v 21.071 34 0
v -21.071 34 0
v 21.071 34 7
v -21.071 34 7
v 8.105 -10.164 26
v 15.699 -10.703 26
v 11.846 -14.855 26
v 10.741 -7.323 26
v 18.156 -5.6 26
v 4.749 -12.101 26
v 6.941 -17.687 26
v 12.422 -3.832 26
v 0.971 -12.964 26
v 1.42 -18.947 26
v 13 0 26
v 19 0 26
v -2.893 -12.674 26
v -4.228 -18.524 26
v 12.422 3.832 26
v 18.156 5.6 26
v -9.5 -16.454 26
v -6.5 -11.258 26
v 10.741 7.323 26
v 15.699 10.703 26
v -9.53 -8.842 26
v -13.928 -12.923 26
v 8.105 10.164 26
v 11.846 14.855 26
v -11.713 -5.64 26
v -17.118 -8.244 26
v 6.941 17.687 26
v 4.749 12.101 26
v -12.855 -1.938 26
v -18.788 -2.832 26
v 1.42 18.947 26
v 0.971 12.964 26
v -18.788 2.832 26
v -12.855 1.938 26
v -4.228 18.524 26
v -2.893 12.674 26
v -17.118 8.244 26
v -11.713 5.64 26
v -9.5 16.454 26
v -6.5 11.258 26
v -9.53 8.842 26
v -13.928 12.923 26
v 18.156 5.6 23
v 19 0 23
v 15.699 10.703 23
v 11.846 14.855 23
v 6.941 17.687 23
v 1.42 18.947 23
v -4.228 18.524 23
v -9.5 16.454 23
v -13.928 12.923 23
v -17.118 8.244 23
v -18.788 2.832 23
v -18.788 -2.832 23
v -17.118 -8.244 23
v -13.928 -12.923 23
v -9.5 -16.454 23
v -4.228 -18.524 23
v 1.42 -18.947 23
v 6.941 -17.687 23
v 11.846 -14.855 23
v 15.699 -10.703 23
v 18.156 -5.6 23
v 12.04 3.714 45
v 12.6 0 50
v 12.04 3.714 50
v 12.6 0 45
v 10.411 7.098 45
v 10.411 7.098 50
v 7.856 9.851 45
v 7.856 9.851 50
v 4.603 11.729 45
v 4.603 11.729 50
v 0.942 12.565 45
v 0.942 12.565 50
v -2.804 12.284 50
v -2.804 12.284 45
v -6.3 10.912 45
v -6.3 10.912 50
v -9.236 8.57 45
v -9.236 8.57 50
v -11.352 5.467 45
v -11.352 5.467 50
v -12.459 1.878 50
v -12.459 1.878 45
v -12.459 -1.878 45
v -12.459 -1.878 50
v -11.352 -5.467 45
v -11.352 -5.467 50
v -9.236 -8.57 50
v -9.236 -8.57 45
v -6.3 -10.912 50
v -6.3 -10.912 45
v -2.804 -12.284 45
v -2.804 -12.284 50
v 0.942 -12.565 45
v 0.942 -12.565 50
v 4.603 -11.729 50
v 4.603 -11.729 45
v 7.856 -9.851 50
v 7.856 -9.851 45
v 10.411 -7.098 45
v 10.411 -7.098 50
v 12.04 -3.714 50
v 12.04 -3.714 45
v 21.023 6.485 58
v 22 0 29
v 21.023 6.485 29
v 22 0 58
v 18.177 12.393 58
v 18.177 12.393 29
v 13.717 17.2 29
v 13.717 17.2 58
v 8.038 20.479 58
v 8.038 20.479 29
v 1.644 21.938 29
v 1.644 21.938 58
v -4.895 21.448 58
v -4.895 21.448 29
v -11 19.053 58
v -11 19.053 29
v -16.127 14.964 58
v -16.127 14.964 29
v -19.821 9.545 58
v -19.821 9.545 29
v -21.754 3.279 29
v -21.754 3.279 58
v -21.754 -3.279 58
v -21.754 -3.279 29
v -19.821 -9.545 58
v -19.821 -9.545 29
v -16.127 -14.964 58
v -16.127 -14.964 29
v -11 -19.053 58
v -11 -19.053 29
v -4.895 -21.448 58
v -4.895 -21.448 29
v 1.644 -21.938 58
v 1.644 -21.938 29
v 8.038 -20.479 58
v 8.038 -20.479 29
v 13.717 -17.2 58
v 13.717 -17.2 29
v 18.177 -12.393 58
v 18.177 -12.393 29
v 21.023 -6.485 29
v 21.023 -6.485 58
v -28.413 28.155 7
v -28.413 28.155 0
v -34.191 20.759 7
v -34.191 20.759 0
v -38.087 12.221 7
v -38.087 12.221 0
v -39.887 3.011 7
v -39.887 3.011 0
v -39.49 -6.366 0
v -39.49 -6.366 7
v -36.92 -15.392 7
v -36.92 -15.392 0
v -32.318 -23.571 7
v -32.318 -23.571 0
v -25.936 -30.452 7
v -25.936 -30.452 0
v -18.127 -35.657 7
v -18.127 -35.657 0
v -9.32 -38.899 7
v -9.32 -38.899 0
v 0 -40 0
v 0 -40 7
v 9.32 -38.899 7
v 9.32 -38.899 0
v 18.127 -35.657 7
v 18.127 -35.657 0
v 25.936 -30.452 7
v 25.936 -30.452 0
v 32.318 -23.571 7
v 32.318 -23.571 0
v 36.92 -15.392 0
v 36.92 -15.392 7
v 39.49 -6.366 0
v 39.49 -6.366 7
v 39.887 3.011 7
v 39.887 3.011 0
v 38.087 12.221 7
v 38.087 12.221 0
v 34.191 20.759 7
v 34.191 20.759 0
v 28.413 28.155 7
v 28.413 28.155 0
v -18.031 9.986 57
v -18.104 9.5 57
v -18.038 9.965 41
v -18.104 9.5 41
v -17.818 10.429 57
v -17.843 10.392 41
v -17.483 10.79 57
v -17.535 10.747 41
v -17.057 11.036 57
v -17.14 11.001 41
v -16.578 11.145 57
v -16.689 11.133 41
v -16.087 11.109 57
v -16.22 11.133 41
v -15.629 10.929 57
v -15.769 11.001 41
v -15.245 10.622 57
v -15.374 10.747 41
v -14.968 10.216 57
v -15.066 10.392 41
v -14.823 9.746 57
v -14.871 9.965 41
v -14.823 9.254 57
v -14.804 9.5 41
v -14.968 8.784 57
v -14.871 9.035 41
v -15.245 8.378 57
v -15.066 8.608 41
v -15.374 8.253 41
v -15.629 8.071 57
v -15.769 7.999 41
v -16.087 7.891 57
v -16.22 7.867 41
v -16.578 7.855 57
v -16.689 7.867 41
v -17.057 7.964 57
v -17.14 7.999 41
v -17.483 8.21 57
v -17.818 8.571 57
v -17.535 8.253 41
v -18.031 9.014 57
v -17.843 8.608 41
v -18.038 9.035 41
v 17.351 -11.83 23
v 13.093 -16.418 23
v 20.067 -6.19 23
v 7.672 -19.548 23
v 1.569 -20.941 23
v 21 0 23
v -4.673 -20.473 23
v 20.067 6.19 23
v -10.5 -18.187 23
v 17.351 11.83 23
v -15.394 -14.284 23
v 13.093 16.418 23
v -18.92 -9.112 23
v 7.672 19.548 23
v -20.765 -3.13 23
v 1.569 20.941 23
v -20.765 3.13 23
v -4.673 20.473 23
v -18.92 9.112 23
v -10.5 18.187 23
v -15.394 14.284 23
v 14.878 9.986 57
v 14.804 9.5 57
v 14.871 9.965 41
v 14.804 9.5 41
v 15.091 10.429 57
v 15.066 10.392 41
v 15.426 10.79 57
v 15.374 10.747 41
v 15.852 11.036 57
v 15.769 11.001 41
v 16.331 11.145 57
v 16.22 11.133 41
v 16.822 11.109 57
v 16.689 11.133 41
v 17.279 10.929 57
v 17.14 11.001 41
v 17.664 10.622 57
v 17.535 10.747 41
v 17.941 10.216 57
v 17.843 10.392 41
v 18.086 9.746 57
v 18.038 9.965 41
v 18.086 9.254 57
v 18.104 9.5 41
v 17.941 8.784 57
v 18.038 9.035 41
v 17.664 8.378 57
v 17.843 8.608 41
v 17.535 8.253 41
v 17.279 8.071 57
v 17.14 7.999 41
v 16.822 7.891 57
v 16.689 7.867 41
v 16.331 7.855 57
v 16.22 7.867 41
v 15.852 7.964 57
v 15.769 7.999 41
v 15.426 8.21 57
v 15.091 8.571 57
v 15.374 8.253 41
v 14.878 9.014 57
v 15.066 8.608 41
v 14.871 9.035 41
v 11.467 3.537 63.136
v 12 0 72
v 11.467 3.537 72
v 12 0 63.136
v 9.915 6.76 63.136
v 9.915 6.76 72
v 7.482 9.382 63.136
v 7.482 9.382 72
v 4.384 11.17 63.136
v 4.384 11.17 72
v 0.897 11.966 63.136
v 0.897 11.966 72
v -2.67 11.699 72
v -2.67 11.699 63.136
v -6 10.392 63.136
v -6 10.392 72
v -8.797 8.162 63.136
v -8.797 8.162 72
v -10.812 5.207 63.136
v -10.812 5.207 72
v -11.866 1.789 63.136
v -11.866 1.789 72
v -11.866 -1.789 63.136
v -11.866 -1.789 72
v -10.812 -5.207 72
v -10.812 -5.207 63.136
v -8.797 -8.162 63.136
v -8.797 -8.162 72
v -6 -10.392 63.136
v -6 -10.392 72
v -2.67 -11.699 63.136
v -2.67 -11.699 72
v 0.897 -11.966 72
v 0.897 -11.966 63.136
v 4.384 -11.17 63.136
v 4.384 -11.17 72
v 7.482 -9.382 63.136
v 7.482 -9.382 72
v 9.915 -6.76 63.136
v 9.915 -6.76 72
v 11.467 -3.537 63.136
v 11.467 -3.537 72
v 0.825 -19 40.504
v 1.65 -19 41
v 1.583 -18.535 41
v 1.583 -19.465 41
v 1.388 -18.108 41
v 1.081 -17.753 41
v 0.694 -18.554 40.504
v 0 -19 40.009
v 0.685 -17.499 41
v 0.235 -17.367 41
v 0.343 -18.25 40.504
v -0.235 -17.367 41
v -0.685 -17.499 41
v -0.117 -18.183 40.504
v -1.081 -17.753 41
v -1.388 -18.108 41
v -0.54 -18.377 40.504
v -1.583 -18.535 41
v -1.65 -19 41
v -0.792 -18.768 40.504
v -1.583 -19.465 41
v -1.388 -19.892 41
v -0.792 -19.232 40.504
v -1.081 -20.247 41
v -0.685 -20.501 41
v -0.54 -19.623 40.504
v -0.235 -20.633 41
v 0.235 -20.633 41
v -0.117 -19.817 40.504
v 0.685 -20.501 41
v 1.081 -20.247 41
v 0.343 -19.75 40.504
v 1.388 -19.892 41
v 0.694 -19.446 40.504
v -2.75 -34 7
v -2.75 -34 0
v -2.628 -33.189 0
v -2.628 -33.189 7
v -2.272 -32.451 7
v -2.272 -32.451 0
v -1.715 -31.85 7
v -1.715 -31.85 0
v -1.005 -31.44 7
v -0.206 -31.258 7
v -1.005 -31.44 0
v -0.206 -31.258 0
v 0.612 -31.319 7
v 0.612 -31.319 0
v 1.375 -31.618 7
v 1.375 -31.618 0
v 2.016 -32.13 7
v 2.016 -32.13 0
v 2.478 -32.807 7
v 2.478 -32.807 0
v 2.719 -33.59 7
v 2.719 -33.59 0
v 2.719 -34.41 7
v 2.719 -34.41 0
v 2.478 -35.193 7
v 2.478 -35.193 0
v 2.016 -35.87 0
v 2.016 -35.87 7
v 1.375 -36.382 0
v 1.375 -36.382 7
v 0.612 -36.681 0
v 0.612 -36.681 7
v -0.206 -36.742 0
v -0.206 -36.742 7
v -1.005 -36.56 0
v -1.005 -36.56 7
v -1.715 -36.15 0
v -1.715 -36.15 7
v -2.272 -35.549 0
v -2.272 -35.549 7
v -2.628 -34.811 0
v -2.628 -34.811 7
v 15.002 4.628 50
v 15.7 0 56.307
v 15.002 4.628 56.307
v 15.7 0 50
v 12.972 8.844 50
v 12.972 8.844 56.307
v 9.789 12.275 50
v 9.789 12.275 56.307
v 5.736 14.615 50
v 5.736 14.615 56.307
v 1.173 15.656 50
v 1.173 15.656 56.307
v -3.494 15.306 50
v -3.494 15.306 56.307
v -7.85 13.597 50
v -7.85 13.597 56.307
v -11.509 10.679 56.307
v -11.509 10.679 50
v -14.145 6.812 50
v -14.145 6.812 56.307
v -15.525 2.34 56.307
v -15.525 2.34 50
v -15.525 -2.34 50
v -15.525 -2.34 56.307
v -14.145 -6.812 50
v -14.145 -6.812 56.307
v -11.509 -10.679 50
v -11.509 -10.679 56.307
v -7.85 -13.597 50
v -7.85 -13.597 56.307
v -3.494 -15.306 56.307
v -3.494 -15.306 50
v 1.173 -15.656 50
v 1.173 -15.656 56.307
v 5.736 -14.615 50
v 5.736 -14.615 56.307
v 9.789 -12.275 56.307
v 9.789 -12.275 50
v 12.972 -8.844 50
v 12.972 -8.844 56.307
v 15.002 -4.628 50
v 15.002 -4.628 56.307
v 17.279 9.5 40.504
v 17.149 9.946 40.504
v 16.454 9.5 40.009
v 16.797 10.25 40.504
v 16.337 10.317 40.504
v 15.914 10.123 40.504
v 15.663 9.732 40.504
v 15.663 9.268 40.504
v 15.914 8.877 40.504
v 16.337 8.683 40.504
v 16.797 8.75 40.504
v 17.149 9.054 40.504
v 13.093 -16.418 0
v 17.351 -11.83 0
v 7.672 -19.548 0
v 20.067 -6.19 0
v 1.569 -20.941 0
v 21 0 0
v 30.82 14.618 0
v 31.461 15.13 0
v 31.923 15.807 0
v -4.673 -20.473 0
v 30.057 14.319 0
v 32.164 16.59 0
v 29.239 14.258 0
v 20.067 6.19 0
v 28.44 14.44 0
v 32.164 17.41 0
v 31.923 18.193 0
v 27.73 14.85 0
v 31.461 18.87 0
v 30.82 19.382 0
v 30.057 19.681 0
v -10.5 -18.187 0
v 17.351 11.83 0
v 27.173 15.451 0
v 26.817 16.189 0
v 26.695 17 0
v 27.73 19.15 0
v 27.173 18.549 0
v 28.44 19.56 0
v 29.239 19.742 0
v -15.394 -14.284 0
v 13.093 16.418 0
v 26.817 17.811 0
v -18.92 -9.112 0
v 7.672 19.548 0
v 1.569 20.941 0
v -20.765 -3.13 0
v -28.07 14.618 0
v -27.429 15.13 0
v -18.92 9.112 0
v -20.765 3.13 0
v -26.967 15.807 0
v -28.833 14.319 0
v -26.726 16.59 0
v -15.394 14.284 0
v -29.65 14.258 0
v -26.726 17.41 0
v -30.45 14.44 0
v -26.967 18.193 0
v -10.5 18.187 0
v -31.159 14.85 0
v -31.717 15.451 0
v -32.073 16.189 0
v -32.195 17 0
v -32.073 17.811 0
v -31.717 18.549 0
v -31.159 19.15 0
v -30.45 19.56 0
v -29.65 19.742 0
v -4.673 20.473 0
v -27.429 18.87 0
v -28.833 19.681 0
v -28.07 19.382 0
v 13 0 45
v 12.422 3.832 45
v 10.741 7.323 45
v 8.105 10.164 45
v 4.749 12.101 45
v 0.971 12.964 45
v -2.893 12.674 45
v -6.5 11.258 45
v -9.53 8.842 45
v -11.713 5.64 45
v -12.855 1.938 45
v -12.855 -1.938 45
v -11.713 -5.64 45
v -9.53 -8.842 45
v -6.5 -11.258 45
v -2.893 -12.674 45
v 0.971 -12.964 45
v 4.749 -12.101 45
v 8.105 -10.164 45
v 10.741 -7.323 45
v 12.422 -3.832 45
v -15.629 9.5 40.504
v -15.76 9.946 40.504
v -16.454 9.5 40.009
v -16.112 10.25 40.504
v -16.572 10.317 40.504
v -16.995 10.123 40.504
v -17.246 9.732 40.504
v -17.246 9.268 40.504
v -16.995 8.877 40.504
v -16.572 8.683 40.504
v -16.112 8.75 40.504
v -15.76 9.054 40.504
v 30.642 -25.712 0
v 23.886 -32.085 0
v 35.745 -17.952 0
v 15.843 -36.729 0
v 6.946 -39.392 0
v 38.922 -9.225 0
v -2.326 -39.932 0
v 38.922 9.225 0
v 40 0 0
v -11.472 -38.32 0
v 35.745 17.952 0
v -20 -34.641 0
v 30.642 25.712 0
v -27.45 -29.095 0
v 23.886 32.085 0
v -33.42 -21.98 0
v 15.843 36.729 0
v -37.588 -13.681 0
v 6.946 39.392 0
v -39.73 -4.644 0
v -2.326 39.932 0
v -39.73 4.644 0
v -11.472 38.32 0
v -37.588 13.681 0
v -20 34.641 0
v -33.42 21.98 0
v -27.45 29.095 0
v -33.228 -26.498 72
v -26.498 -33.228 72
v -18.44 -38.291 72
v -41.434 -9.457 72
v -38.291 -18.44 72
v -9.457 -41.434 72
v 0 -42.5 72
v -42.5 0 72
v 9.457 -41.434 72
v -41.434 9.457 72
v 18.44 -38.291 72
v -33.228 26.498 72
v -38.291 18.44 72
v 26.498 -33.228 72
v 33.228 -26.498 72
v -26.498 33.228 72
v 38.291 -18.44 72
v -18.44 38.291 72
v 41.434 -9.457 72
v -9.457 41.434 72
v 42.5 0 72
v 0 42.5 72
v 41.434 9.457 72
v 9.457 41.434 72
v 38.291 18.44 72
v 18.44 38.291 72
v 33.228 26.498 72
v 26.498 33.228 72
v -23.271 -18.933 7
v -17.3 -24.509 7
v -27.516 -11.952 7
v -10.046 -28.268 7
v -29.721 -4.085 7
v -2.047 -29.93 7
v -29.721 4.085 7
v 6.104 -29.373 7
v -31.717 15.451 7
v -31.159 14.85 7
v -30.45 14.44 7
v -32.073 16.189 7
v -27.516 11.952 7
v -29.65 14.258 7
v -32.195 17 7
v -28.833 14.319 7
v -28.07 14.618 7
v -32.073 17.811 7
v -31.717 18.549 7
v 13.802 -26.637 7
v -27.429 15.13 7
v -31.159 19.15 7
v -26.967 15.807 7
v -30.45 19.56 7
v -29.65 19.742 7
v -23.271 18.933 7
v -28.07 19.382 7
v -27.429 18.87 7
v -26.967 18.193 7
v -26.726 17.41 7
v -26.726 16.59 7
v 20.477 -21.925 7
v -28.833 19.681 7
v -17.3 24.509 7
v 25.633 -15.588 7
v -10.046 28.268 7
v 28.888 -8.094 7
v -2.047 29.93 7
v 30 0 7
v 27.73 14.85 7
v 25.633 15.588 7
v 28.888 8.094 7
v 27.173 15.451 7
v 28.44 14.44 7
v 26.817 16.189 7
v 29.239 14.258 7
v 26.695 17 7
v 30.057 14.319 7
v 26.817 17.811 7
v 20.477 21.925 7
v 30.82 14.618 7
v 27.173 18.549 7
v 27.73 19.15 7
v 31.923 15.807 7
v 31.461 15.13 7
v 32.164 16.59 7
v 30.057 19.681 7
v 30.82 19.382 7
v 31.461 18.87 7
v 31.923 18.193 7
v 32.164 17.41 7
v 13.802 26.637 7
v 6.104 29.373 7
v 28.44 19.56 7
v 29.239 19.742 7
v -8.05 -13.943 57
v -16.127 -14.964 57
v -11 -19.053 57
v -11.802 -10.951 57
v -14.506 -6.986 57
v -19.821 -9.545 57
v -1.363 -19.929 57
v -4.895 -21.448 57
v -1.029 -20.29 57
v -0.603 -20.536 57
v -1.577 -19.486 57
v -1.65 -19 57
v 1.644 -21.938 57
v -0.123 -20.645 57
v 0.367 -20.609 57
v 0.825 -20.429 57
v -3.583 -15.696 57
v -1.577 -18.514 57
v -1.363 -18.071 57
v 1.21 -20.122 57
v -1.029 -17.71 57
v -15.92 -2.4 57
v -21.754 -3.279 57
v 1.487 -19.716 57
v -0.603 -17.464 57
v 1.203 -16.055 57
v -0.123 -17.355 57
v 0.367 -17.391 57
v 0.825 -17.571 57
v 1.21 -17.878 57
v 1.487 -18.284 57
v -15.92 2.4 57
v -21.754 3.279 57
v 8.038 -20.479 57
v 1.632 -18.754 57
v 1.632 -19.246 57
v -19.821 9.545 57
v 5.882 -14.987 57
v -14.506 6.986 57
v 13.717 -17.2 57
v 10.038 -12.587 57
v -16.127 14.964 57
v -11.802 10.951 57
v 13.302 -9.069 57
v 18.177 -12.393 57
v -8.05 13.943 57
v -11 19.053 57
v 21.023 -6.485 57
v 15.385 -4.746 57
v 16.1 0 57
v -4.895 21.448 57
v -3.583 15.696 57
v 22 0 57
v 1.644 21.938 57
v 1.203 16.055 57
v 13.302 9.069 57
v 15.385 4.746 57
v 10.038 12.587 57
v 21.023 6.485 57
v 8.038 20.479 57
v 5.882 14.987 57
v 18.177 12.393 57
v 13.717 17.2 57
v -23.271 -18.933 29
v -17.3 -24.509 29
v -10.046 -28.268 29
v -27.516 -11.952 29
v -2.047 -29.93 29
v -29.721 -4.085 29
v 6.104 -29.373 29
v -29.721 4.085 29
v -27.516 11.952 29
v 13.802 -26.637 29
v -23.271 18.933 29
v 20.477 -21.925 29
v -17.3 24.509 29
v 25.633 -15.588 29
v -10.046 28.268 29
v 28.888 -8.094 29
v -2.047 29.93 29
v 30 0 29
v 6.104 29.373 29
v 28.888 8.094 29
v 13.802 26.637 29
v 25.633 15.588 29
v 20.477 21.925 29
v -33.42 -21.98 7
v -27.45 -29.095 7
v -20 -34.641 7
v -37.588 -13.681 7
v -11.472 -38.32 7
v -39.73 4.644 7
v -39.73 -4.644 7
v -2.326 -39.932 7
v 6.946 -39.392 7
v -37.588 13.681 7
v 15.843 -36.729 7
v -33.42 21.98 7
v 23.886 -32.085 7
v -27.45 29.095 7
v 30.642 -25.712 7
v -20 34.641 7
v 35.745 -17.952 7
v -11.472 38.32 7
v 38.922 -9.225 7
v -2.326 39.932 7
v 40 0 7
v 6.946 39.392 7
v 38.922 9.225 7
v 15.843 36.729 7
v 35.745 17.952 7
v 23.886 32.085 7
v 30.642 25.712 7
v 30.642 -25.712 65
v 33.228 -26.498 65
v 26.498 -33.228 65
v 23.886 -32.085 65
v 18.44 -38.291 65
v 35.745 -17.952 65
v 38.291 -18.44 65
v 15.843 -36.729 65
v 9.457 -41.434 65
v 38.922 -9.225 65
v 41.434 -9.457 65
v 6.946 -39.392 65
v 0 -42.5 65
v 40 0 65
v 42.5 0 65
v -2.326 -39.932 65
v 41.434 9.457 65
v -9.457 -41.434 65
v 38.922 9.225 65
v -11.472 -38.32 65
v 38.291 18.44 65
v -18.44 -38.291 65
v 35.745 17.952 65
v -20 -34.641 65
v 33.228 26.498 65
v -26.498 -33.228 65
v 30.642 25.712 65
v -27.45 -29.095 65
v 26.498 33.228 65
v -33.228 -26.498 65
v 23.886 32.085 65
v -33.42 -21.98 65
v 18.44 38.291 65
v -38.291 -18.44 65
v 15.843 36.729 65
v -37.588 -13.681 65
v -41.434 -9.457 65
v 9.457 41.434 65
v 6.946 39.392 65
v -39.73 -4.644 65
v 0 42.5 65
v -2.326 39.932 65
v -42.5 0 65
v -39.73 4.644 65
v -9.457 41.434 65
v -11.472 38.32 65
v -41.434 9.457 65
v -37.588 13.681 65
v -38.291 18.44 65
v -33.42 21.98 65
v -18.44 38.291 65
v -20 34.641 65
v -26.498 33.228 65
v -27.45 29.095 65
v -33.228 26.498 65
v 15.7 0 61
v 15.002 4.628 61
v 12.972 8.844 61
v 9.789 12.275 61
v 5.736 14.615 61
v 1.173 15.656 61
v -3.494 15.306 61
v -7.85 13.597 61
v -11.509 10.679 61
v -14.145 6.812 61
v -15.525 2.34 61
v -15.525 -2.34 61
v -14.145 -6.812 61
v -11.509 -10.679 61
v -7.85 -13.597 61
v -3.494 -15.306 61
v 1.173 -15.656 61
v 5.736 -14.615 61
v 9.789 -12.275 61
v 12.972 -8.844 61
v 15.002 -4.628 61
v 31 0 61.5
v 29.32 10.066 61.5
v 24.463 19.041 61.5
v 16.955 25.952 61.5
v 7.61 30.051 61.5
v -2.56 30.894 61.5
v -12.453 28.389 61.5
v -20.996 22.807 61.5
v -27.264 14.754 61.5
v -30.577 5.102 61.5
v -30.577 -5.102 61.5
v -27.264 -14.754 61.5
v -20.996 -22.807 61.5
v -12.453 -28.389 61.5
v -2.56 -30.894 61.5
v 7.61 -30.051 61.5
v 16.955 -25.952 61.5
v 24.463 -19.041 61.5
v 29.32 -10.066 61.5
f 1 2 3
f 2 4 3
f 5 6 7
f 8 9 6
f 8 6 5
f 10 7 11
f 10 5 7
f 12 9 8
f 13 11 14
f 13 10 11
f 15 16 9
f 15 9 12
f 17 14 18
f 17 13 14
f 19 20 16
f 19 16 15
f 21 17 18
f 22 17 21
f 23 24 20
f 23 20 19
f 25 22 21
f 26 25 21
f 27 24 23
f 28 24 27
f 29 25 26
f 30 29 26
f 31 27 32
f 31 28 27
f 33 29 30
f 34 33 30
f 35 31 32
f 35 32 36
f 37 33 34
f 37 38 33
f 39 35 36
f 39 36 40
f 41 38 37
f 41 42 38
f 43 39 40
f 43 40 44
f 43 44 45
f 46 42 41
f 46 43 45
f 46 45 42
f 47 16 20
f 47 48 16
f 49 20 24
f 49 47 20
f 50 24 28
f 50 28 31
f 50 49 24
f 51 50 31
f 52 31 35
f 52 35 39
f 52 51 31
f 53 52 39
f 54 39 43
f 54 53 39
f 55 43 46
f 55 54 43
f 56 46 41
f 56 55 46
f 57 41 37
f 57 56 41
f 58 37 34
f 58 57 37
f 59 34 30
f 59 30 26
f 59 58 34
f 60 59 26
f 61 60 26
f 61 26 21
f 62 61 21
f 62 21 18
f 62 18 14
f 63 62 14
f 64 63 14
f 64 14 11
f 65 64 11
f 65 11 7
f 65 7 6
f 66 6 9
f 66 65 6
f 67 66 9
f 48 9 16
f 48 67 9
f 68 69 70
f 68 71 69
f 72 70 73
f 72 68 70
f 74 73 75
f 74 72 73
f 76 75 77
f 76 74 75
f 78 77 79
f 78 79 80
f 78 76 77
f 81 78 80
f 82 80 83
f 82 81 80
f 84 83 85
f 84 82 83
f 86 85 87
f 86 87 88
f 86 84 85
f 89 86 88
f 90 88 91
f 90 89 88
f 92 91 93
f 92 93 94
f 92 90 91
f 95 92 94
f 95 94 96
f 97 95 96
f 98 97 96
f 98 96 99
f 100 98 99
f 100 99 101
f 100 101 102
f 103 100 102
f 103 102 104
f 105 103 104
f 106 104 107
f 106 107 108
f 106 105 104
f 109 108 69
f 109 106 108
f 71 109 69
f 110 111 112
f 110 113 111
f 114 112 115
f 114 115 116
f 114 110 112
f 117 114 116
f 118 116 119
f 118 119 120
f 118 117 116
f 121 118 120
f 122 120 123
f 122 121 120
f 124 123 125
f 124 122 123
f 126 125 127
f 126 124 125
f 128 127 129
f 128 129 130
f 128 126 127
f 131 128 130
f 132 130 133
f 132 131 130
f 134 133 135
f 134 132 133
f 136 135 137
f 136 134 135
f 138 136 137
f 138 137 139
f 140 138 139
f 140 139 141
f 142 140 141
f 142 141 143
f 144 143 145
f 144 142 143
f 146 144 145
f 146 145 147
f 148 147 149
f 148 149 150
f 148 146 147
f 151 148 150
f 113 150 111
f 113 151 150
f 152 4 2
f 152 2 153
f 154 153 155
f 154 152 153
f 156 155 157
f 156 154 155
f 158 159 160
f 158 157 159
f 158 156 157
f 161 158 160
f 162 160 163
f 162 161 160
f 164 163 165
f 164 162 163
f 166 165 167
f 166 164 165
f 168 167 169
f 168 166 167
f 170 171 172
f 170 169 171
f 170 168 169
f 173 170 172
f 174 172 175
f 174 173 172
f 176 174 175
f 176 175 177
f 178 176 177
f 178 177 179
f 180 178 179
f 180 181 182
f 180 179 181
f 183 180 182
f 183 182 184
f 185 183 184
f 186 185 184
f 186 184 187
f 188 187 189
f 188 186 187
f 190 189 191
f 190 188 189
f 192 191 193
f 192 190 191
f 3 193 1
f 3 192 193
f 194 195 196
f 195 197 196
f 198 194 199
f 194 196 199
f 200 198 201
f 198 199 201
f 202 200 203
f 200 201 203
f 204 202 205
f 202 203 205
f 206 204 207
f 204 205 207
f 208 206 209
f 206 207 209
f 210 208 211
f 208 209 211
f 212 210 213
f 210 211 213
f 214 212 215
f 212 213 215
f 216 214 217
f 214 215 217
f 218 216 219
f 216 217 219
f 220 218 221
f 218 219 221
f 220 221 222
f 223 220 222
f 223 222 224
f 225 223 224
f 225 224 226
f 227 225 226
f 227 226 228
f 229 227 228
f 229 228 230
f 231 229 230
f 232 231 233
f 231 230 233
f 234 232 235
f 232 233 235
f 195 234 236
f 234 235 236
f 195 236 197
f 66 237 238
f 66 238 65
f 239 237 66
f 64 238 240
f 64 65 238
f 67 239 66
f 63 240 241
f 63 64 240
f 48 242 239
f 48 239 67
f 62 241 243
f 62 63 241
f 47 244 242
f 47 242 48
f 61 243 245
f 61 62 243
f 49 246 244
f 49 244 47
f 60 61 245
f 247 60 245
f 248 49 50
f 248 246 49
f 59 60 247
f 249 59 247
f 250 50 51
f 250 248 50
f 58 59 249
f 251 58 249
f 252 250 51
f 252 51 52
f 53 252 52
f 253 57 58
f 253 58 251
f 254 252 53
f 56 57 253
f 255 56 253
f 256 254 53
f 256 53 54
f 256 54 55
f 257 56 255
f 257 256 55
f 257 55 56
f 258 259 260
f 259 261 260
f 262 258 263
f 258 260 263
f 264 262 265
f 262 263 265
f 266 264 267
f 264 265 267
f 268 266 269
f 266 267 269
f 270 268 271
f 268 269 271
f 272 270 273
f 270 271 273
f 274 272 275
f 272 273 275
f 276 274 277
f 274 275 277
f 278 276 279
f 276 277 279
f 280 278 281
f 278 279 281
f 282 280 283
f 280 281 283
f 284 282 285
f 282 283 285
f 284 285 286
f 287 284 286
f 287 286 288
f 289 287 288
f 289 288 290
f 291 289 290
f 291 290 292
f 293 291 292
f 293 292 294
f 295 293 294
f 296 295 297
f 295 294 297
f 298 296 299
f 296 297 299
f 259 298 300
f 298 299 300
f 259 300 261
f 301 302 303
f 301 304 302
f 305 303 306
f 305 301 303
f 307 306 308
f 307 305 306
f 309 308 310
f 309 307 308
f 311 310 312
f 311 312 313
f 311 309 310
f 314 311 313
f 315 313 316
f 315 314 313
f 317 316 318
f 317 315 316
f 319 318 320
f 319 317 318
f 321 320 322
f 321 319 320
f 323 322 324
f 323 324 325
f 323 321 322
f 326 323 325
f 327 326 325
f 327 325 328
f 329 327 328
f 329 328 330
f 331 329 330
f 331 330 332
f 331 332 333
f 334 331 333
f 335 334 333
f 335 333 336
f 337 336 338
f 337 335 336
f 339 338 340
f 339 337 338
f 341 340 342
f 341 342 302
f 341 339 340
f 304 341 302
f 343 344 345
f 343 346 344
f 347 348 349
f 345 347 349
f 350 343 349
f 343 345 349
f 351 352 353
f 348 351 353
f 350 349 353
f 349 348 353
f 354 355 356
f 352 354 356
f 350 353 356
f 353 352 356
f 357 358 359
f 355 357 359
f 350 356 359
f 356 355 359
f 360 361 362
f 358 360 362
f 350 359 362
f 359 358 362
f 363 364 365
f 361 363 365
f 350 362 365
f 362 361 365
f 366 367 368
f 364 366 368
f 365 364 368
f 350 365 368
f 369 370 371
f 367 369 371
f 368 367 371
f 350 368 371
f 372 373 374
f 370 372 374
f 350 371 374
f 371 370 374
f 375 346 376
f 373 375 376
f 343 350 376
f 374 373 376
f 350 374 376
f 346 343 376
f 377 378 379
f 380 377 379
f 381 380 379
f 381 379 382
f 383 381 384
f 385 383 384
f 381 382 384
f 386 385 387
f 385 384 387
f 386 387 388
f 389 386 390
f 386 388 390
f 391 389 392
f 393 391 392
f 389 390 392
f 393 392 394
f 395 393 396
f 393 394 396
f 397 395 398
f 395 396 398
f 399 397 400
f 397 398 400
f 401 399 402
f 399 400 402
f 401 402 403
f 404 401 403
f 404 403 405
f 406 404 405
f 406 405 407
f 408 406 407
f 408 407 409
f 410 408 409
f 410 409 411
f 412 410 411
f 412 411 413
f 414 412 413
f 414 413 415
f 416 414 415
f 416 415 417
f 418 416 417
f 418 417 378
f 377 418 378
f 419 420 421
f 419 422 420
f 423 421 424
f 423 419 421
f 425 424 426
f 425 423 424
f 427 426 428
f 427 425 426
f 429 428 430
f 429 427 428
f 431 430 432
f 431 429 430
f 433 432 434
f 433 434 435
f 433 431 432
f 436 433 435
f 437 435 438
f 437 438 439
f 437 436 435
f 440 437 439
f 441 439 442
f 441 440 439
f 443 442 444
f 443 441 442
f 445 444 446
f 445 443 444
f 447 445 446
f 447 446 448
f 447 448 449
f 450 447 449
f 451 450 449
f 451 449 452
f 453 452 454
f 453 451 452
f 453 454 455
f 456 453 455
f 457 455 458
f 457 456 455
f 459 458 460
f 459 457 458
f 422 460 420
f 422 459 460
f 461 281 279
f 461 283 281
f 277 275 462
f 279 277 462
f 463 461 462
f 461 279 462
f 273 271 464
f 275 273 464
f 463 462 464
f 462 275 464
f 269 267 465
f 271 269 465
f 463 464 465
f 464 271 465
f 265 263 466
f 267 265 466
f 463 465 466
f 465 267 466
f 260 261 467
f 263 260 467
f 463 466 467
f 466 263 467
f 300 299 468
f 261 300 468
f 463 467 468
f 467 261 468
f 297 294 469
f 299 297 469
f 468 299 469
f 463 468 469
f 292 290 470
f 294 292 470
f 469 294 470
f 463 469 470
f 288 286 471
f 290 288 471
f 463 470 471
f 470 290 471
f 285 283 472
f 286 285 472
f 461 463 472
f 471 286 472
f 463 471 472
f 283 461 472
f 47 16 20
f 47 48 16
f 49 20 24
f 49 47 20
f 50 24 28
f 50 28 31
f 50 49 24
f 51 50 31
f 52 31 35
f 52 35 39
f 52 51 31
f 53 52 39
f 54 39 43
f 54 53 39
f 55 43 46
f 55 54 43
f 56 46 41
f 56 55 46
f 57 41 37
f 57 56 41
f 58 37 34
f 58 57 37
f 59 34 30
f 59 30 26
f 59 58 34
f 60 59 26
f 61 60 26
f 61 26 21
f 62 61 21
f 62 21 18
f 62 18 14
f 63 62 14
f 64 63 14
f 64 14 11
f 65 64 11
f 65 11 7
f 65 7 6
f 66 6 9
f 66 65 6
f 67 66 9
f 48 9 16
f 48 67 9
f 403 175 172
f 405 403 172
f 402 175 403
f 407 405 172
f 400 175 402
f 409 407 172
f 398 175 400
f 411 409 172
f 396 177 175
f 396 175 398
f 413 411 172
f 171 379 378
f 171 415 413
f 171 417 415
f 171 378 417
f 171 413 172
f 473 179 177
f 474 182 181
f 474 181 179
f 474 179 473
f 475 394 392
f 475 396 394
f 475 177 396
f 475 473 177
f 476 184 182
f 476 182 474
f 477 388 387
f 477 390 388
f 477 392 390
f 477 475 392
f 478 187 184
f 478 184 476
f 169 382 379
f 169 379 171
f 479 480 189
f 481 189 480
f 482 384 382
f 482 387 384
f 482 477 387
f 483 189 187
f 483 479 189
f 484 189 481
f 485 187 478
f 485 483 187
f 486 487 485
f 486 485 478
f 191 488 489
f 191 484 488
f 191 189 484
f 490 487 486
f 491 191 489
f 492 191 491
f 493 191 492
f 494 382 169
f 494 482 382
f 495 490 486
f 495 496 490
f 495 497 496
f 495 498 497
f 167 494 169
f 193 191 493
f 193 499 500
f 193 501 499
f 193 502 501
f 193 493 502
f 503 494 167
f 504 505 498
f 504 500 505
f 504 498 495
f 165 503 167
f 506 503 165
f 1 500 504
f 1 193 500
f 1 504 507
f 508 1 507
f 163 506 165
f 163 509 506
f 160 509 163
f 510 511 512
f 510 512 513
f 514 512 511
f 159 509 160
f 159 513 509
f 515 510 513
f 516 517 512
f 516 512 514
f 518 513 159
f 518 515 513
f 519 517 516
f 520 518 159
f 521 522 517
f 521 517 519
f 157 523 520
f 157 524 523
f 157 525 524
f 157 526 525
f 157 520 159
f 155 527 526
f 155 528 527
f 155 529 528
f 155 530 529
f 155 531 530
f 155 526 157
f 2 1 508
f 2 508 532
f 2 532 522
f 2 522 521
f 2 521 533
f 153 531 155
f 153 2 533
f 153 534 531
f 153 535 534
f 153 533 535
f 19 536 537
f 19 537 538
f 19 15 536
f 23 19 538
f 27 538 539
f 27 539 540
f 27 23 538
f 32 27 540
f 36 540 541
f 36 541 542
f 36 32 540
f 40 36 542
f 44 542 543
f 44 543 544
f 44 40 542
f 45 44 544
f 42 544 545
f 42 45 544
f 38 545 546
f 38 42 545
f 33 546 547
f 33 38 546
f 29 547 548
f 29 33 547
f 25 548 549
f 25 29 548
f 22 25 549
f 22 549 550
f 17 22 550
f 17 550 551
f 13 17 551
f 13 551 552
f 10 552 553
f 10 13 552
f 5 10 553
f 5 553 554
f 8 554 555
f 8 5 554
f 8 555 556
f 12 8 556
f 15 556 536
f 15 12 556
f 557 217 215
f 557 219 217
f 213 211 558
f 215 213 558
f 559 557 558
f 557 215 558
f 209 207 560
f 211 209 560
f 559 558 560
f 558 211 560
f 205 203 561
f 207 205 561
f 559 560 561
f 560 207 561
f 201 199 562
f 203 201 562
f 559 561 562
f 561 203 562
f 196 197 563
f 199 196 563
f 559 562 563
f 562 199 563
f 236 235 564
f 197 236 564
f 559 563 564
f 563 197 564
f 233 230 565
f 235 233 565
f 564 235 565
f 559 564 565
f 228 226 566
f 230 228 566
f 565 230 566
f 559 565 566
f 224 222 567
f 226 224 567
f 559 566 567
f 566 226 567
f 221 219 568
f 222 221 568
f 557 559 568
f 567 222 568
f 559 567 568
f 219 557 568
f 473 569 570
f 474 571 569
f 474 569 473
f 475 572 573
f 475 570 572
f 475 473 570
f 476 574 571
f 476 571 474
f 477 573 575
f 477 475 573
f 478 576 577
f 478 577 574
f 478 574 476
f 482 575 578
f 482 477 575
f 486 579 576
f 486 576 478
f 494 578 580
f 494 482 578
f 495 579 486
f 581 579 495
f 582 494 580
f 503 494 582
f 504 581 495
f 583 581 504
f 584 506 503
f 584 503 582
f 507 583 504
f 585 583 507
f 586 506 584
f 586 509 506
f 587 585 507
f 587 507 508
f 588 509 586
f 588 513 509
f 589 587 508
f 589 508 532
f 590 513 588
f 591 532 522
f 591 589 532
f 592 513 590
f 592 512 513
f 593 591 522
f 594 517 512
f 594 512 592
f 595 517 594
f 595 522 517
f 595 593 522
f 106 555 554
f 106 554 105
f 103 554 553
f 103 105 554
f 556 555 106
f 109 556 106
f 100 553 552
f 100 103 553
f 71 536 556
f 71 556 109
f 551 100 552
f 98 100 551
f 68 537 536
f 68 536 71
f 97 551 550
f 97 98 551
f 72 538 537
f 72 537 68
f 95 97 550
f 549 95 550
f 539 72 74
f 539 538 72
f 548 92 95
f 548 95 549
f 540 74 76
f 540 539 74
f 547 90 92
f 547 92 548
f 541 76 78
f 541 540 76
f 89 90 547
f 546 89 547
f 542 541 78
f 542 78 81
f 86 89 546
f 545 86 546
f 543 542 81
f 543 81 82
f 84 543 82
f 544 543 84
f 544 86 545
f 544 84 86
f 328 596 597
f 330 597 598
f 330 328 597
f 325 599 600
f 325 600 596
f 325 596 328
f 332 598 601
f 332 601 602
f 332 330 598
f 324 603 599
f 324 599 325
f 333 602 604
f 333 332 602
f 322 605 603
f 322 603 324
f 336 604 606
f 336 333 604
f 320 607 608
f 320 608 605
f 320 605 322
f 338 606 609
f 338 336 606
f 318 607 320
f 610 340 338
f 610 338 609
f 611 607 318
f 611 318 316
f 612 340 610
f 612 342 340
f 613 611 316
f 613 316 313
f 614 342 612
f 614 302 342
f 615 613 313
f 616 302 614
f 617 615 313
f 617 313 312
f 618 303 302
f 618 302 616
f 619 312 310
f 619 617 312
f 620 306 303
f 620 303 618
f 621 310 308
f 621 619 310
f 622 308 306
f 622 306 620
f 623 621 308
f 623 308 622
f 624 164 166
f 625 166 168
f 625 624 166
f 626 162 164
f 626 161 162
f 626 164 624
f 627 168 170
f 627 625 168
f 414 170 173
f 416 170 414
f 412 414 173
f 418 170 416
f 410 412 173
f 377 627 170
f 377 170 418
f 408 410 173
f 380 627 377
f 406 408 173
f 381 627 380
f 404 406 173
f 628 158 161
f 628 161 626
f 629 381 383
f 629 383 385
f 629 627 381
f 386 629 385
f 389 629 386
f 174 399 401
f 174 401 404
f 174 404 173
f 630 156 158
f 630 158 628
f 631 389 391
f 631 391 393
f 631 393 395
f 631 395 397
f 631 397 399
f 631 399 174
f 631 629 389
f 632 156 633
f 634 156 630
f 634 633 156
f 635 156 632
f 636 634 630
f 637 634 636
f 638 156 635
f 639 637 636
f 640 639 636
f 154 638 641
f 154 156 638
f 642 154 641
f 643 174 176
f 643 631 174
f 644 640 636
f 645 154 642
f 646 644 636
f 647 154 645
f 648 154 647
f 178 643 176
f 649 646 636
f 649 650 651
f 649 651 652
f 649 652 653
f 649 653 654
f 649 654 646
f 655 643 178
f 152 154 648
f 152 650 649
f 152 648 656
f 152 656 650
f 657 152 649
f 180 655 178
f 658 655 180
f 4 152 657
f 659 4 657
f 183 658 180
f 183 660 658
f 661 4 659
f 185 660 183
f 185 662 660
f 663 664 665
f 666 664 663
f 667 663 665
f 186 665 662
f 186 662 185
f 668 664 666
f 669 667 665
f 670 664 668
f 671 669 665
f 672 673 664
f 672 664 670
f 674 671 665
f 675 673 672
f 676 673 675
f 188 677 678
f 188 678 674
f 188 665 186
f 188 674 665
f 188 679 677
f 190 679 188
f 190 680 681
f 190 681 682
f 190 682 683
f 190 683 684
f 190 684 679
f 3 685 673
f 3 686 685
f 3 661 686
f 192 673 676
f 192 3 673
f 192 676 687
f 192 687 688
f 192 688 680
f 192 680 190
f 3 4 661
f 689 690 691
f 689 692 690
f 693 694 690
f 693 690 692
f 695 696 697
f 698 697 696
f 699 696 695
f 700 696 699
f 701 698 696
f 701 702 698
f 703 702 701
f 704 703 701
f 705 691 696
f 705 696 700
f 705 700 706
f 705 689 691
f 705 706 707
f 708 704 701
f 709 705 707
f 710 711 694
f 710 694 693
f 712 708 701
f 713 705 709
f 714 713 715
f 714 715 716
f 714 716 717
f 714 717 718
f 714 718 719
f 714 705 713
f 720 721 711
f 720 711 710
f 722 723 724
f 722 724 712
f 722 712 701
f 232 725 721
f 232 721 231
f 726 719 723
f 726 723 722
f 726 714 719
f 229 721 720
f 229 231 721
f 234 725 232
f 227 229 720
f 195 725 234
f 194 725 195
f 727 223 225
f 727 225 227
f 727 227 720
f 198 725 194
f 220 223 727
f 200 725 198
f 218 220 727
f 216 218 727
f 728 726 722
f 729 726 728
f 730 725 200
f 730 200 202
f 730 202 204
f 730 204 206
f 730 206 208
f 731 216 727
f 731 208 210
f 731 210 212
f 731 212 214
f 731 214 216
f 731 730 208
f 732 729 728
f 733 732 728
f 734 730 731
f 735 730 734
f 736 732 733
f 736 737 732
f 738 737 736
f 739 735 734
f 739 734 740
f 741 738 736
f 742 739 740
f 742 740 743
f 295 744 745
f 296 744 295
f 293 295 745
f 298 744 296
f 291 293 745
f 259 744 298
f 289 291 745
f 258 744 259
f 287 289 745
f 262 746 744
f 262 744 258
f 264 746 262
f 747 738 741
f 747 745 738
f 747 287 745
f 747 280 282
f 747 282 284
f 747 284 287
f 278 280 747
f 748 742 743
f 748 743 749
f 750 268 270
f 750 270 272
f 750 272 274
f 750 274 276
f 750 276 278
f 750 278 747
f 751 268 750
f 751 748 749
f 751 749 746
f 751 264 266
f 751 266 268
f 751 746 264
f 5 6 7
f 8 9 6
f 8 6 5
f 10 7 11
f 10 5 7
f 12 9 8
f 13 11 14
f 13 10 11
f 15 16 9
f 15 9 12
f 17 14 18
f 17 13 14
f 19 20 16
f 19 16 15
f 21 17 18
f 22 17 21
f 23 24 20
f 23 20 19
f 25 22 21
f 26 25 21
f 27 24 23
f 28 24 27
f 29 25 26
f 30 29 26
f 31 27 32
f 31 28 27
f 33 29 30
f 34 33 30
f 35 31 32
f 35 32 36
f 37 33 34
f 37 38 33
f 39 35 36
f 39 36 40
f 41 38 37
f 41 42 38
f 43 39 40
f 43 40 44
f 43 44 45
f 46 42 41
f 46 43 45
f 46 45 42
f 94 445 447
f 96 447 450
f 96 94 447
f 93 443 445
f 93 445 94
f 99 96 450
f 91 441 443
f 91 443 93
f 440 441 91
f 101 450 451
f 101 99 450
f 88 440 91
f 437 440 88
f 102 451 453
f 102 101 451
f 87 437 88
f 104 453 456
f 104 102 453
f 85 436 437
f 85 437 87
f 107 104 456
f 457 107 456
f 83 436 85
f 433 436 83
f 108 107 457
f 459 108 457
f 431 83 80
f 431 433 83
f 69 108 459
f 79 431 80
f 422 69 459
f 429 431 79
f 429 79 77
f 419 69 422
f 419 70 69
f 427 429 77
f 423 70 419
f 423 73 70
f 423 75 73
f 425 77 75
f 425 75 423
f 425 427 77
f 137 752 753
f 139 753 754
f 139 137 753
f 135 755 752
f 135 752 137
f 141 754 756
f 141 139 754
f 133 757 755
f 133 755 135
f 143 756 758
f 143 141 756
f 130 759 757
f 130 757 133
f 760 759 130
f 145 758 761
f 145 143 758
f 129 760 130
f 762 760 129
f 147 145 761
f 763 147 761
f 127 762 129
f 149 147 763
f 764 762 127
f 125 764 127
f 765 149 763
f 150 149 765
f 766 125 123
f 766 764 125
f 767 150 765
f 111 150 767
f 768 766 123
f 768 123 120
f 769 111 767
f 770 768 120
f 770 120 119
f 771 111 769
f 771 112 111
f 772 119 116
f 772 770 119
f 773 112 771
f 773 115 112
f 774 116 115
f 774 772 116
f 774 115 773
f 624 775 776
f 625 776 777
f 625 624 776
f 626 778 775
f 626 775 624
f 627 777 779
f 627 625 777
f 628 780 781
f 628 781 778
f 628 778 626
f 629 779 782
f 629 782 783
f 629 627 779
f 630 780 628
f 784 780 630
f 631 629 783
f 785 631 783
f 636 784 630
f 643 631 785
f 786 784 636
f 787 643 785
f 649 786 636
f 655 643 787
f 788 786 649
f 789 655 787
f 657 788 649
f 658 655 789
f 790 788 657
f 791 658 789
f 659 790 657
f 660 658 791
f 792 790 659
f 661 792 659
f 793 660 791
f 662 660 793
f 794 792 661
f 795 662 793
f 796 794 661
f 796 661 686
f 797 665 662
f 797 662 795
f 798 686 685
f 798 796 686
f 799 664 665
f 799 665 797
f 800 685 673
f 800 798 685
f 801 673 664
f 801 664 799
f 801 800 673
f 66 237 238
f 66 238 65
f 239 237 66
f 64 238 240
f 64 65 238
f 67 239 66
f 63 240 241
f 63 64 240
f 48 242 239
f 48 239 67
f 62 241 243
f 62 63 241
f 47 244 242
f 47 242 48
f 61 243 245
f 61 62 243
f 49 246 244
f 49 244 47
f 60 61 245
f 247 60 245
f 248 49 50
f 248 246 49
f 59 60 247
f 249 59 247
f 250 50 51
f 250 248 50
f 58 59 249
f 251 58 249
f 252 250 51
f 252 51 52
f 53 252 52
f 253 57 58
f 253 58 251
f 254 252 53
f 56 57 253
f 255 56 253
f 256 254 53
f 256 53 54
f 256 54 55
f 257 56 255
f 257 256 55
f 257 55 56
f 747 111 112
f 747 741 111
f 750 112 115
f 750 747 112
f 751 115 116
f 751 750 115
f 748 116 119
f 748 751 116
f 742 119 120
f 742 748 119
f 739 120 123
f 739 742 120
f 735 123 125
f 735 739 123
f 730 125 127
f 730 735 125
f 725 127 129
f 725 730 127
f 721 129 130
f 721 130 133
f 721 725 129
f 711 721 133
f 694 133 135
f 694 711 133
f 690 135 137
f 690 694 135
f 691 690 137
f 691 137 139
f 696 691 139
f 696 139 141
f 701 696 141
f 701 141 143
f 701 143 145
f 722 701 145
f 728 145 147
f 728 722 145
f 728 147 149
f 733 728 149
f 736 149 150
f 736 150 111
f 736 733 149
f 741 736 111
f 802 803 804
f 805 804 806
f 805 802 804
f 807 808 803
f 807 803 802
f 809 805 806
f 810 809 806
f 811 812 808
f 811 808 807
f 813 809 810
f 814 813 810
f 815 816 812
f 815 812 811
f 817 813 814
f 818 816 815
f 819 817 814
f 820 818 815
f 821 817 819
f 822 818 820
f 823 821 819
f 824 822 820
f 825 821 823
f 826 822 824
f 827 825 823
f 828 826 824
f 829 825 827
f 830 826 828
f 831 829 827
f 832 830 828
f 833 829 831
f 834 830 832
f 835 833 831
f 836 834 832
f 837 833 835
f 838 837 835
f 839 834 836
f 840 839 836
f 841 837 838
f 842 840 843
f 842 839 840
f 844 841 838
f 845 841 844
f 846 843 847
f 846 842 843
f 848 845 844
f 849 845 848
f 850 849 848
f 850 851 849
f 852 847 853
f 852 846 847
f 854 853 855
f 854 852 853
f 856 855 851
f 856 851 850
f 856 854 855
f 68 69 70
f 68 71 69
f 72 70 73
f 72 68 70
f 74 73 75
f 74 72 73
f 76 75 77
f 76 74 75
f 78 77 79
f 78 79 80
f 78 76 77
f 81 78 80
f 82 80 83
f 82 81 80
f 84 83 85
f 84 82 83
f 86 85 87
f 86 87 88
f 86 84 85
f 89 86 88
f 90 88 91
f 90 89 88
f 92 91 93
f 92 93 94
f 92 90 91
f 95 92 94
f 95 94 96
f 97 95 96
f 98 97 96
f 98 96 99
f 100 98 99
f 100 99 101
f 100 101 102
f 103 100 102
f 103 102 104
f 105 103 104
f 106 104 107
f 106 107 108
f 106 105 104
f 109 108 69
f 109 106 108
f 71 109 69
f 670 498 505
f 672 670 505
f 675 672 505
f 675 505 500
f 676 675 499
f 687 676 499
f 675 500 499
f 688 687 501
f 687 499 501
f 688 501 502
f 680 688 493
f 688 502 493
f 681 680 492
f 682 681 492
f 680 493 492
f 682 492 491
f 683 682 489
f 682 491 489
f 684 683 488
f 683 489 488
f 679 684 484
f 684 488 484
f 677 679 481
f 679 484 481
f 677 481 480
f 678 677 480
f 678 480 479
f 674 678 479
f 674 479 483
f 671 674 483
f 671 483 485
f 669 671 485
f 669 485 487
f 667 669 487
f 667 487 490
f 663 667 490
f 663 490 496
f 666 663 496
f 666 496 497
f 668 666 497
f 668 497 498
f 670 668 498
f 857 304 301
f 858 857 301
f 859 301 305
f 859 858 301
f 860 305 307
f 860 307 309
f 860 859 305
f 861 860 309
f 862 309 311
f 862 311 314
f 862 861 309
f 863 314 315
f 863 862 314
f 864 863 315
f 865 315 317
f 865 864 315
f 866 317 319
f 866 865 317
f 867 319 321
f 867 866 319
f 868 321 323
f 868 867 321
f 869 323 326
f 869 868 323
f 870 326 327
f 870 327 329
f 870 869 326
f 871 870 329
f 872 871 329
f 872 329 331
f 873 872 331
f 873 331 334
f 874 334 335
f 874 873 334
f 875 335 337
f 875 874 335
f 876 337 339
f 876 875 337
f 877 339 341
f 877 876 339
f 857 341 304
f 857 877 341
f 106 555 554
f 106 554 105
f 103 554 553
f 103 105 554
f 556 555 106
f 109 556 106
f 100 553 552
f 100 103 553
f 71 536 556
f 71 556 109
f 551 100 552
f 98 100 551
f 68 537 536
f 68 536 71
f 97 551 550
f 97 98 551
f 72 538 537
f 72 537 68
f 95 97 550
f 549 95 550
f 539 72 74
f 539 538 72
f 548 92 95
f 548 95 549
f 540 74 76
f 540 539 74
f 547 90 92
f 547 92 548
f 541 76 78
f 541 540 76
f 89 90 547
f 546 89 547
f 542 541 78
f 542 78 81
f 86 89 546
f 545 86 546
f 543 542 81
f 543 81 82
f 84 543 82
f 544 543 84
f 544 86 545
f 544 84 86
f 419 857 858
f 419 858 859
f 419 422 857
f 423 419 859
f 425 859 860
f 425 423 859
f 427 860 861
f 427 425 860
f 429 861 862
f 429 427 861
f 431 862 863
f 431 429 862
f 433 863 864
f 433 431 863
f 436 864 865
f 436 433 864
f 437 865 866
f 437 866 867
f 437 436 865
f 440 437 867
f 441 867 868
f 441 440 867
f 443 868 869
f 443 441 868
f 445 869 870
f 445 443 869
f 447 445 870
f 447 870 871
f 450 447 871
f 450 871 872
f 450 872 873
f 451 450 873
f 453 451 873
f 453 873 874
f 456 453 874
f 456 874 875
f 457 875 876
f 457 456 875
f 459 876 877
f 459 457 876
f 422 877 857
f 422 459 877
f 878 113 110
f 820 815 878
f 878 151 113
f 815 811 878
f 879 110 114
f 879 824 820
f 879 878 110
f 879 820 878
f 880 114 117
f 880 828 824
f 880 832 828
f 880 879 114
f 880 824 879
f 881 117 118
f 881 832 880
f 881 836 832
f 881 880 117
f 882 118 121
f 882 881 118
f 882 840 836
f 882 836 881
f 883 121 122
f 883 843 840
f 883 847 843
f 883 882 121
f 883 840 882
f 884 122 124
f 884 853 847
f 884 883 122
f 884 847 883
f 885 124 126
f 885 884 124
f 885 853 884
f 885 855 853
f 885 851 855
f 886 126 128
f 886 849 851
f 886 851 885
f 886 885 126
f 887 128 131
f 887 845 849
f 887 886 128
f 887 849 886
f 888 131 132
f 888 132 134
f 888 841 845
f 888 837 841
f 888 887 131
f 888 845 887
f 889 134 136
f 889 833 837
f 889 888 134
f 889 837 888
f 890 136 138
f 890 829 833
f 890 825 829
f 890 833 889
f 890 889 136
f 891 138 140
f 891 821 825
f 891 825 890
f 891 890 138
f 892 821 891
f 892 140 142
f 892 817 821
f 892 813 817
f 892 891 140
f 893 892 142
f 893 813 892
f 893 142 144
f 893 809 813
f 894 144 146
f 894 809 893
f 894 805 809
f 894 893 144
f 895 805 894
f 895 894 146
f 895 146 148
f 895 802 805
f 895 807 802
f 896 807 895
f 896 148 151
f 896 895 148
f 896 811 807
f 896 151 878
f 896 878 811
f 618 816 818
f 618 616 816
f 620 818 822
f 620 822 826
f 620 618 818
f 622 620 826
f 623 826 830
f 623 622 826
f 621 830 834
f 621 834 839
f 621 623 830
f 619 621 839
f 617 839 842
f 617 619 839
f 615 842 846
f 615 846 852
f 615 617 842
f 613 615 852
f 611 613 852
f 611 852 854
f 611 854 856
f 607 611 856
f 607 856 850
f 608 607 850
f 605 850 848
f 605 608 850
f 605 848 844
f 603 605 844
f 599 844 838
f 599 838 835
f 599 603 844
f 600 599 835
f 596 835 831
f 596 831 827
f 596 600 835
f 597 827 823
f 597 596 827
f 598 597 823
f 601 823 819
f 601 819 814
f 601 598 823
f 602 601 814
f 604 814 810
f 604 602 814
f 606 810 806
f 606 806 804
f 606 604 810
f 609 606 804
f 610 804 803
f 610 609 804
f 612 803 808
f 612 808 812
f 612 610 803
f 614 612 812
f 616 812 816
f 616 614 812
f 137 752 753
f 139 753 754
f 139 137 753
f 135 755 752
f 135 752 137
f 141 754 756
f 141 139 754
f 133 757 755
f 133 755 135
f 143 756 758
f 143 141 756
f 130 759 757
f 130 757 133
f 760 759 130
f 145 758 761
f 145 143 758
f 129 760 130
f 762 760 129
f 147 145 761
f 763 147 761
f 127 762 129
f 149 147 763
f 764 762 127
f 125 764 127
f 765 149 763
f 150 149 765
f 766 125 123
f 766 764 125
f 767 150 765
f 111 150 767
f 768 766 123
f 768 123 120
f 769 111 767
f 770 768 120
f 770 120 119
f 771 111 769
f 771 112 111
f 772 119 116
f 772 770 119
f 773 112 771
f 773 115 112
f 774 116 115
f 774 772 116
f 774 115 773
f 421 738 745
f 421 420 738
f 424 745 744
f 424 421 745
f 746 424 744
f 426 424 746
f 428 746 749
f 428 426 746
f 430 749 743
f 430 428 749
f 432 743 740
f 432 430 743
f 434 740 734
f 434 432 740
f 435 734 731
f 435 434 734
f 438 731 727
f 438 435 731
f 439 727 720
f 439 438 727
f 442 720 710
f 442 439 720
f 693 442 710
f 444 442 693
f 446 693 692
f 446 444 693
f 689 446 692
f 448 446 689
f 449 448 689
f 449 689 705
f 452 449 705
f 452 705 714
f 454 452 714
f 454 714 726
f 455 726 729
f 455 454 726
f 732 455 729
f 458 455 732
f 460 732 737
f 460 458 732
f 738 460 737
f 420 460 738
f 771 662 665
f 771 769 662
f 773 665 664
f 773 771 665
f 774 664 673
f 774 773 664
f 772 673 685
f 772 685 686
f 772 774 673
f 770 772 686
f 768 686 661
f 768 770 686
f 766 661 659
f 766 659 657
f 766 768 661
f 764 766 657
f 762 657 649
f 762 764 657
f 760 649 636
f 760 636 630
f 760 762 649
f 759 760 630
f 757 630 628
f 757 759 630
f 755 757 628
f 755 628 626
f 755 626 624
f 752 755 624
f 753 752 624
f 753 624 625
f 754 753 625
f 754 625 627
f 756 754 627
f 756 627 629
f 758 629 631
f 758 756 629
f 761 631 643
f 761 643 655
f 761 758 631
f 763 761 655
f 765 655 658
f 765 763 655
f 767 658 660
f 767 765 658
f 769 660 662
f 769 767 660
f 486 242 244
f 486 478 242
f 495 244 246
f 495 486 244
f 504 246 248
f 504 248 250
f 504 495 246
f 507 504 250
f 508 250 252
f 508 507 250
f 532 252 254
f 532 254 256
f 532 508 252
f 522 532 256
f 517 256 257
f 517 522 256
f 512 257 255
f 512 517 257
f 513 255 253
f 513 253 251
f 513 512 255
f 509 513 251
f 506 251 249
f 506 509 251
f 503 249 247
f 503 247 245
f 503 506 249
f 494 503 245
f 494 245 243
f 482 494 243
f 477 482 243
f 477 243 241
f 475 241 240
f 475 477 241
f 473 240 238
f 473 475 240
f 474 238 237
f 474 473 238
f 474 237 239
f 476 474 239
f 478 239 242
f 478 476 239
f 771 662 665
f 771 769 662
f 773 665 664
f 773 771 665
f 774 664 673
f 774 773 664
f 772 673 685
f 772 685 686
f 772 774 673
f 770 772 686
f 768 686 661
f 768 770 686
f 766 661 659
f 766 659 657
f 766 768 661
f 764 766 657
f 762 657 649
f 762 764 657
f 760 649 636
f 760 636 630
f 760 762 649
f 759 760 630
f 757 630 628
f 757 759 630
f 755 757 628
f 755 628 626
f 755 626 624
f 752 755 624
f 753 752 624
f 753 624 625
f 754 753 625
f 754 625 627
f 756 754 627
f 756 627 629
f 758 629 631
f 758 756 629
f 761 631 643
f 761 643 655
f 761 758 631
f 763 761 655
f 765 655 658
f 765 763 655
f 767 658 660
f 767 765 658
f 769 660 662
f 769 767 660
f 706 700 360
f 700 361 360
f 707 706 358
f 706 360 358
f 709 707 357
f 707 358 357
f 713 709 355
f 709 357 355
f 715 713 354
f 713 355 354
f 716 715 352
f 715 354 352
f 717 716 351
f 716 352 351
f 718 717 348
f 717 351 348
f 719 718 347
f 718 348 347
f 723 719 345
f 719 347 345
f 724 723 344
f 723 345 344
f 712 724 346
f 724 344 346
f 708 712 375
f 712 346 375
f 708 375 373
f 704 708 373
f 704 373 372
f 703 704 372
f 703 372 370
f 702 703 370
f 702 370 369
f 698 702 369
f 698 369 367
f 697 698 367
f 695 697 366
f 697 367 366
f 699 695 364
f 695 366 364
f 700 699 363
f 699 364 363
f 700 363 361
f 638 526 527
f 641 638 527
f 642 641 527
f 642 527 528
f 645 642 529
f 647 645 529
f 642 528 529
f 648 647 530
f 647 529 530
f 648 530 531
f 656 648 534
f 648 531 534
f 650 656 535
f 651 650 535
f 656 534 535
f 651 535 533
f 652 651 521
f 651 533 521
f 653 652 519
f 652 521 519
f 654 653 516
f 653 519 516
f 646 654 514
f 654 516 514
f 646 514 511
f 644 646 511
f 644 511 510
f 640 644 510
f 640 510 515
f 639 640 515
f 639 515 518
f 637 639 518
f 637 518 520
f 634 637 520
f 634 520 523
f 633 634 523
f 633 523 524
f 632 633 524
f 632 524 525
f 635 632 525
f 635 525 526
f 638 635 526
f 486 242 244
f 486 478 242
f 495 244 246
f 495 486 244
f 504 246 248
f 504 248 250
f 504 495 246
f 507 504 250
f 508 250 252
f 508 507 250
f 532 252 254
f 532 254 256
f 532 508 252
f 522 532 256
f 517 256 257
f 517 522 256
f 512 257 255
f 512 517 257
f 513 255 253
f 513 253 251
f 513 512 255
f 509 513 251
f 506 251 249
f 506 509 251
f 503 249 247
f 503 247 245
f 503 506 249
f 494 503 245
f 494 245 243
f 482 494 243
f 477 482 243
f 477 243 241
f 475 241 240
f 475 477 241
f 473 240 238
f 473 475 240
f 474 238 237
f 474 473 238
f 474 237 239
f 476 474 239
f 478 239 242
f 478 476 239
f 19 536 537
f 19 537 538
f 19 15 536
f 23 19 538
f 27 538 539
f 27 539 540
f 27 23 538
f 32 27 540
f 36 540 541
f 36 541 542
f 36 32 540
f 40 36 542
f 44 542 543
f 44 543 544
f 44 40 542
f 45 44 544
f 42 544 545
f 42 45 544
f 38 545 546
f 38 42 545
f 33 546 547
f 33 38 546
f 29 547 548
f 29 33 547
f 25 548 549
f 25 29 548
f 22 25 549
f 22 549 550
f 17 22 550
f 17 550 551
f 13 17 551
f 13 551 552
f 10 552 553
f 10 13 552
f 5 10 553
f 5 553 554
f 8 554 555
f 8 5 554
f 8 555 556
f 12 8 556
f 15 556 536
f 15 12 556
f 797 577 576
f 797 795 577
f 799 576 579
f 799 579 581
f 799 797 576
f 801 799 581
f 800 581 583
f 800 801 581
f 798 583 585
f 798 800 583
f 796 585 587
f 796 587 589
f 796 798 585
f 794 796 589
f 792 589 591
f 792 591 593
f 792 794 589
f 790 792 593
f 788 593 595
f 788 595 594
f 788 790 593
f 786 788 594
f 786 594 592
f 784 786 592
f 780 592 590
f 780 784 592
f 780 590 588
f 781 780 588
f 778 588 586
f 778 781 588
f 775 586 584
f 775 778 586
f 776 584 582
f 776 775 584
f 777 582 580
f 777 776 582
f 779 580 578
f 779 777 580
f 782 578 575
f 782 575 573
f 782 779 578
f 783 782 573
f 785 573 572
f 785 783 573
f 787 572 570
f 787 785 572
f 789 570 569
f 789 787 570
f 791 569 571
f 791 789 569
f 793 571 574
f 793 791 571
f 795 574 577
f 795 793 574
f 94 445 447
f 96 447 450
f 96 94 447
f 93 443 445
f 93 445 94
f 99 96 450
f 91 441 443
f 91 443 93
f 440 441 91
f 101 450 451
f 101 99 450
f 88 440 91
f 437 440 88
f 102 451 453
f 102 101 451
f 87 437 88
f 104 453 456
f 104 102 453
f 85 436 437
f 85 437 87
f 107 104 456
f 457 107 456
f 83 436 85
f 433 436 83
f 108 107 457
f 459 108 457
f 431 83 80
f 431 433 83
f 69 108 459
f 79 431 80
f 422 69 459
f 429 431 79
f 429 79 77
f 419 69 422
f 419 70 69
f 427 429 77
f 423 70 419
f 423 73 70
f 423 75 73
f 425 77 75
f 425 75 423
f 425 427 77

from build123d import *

# Parameters (mm, degrees)
F6_W     = 80
F6_H     = 8
F7_DEPTH = 10
F9_D     = 3.3
F9_DEPTH = 16
F9_TIP   = 0.9914200214
F11_D    = 5.5


with BuildPart() as f3:
    # F2 (on Front) → F3 (revolve)
    with BuildSketch(Plane.XZ):
        Polygon((22, 58), (40, 65), (42.5, 65), (42.5, 72), (11.999999553, 72), (11.999999553, 63.1361962541), (15.7, 61), (15.7, 50), (12.6, 50), (12.6, 45), (13, 45), (13, 26), (19, 26), (19, 23), (21, 23), (21, 0), (40, 0), (40, 7), (30, 7), (30, 29), (22, 29), align=None)
    revolve(axis=Axis((0, 0, 6.2499970198), (0, 0, 1)))


with BuildPart() as f4:
    # F1 (on Front) → F4 (revolve)
    with BuildSketch(Plane.XZ):
        Polygon((21, 23), (21, 0), (40, 0), (40, 7), (30, 7), (30, 29), (22, 29), (22, 57), (16.1, 57), (15.7, 56.307179677), (15.7, 50), (12.6, 50), (12.6, 45), (13, 45), (13, 26), (19, 26), (19, 23), align=None)
    revolve(axis=Axis((0, 0, 6.2499970198), (0, 0, 1)))

    # F6 (on offset) → F7 (cut)
    with BuildSketch(Plane.XZ.offset(-34)):
        with Locations((0, 3.5)):
            Rectangle(F6_W, F6_H)
    extrude(amount=-F7_DEPTH, mode=Mode.SUBTRACT)

    # F9
    with Locations(Plane.XY.offset(57)):
        with Locations((16.4544826719, 9.5), (0, -19), (-16.4544826719, 9.5)):
            Hole(F9_D / 2, depth=F9_DEPTH)
            with Locations((0, 0, -(F9_DEPTH + F9_TIP / 2))):  # 118° drill point
                Cone(0, F9_D / 2, F9_TIP, mode=Mode.SUBTRACT)

    # F11 (through all)
    with Locations(Plane.XY.offset(7)):
        with Locations((-29.4448637287, 17), (29.4448637287, 17), (0, -34)):
            Hole(F11_D / 2)


solid = Compound([f3.part, f4.part])
